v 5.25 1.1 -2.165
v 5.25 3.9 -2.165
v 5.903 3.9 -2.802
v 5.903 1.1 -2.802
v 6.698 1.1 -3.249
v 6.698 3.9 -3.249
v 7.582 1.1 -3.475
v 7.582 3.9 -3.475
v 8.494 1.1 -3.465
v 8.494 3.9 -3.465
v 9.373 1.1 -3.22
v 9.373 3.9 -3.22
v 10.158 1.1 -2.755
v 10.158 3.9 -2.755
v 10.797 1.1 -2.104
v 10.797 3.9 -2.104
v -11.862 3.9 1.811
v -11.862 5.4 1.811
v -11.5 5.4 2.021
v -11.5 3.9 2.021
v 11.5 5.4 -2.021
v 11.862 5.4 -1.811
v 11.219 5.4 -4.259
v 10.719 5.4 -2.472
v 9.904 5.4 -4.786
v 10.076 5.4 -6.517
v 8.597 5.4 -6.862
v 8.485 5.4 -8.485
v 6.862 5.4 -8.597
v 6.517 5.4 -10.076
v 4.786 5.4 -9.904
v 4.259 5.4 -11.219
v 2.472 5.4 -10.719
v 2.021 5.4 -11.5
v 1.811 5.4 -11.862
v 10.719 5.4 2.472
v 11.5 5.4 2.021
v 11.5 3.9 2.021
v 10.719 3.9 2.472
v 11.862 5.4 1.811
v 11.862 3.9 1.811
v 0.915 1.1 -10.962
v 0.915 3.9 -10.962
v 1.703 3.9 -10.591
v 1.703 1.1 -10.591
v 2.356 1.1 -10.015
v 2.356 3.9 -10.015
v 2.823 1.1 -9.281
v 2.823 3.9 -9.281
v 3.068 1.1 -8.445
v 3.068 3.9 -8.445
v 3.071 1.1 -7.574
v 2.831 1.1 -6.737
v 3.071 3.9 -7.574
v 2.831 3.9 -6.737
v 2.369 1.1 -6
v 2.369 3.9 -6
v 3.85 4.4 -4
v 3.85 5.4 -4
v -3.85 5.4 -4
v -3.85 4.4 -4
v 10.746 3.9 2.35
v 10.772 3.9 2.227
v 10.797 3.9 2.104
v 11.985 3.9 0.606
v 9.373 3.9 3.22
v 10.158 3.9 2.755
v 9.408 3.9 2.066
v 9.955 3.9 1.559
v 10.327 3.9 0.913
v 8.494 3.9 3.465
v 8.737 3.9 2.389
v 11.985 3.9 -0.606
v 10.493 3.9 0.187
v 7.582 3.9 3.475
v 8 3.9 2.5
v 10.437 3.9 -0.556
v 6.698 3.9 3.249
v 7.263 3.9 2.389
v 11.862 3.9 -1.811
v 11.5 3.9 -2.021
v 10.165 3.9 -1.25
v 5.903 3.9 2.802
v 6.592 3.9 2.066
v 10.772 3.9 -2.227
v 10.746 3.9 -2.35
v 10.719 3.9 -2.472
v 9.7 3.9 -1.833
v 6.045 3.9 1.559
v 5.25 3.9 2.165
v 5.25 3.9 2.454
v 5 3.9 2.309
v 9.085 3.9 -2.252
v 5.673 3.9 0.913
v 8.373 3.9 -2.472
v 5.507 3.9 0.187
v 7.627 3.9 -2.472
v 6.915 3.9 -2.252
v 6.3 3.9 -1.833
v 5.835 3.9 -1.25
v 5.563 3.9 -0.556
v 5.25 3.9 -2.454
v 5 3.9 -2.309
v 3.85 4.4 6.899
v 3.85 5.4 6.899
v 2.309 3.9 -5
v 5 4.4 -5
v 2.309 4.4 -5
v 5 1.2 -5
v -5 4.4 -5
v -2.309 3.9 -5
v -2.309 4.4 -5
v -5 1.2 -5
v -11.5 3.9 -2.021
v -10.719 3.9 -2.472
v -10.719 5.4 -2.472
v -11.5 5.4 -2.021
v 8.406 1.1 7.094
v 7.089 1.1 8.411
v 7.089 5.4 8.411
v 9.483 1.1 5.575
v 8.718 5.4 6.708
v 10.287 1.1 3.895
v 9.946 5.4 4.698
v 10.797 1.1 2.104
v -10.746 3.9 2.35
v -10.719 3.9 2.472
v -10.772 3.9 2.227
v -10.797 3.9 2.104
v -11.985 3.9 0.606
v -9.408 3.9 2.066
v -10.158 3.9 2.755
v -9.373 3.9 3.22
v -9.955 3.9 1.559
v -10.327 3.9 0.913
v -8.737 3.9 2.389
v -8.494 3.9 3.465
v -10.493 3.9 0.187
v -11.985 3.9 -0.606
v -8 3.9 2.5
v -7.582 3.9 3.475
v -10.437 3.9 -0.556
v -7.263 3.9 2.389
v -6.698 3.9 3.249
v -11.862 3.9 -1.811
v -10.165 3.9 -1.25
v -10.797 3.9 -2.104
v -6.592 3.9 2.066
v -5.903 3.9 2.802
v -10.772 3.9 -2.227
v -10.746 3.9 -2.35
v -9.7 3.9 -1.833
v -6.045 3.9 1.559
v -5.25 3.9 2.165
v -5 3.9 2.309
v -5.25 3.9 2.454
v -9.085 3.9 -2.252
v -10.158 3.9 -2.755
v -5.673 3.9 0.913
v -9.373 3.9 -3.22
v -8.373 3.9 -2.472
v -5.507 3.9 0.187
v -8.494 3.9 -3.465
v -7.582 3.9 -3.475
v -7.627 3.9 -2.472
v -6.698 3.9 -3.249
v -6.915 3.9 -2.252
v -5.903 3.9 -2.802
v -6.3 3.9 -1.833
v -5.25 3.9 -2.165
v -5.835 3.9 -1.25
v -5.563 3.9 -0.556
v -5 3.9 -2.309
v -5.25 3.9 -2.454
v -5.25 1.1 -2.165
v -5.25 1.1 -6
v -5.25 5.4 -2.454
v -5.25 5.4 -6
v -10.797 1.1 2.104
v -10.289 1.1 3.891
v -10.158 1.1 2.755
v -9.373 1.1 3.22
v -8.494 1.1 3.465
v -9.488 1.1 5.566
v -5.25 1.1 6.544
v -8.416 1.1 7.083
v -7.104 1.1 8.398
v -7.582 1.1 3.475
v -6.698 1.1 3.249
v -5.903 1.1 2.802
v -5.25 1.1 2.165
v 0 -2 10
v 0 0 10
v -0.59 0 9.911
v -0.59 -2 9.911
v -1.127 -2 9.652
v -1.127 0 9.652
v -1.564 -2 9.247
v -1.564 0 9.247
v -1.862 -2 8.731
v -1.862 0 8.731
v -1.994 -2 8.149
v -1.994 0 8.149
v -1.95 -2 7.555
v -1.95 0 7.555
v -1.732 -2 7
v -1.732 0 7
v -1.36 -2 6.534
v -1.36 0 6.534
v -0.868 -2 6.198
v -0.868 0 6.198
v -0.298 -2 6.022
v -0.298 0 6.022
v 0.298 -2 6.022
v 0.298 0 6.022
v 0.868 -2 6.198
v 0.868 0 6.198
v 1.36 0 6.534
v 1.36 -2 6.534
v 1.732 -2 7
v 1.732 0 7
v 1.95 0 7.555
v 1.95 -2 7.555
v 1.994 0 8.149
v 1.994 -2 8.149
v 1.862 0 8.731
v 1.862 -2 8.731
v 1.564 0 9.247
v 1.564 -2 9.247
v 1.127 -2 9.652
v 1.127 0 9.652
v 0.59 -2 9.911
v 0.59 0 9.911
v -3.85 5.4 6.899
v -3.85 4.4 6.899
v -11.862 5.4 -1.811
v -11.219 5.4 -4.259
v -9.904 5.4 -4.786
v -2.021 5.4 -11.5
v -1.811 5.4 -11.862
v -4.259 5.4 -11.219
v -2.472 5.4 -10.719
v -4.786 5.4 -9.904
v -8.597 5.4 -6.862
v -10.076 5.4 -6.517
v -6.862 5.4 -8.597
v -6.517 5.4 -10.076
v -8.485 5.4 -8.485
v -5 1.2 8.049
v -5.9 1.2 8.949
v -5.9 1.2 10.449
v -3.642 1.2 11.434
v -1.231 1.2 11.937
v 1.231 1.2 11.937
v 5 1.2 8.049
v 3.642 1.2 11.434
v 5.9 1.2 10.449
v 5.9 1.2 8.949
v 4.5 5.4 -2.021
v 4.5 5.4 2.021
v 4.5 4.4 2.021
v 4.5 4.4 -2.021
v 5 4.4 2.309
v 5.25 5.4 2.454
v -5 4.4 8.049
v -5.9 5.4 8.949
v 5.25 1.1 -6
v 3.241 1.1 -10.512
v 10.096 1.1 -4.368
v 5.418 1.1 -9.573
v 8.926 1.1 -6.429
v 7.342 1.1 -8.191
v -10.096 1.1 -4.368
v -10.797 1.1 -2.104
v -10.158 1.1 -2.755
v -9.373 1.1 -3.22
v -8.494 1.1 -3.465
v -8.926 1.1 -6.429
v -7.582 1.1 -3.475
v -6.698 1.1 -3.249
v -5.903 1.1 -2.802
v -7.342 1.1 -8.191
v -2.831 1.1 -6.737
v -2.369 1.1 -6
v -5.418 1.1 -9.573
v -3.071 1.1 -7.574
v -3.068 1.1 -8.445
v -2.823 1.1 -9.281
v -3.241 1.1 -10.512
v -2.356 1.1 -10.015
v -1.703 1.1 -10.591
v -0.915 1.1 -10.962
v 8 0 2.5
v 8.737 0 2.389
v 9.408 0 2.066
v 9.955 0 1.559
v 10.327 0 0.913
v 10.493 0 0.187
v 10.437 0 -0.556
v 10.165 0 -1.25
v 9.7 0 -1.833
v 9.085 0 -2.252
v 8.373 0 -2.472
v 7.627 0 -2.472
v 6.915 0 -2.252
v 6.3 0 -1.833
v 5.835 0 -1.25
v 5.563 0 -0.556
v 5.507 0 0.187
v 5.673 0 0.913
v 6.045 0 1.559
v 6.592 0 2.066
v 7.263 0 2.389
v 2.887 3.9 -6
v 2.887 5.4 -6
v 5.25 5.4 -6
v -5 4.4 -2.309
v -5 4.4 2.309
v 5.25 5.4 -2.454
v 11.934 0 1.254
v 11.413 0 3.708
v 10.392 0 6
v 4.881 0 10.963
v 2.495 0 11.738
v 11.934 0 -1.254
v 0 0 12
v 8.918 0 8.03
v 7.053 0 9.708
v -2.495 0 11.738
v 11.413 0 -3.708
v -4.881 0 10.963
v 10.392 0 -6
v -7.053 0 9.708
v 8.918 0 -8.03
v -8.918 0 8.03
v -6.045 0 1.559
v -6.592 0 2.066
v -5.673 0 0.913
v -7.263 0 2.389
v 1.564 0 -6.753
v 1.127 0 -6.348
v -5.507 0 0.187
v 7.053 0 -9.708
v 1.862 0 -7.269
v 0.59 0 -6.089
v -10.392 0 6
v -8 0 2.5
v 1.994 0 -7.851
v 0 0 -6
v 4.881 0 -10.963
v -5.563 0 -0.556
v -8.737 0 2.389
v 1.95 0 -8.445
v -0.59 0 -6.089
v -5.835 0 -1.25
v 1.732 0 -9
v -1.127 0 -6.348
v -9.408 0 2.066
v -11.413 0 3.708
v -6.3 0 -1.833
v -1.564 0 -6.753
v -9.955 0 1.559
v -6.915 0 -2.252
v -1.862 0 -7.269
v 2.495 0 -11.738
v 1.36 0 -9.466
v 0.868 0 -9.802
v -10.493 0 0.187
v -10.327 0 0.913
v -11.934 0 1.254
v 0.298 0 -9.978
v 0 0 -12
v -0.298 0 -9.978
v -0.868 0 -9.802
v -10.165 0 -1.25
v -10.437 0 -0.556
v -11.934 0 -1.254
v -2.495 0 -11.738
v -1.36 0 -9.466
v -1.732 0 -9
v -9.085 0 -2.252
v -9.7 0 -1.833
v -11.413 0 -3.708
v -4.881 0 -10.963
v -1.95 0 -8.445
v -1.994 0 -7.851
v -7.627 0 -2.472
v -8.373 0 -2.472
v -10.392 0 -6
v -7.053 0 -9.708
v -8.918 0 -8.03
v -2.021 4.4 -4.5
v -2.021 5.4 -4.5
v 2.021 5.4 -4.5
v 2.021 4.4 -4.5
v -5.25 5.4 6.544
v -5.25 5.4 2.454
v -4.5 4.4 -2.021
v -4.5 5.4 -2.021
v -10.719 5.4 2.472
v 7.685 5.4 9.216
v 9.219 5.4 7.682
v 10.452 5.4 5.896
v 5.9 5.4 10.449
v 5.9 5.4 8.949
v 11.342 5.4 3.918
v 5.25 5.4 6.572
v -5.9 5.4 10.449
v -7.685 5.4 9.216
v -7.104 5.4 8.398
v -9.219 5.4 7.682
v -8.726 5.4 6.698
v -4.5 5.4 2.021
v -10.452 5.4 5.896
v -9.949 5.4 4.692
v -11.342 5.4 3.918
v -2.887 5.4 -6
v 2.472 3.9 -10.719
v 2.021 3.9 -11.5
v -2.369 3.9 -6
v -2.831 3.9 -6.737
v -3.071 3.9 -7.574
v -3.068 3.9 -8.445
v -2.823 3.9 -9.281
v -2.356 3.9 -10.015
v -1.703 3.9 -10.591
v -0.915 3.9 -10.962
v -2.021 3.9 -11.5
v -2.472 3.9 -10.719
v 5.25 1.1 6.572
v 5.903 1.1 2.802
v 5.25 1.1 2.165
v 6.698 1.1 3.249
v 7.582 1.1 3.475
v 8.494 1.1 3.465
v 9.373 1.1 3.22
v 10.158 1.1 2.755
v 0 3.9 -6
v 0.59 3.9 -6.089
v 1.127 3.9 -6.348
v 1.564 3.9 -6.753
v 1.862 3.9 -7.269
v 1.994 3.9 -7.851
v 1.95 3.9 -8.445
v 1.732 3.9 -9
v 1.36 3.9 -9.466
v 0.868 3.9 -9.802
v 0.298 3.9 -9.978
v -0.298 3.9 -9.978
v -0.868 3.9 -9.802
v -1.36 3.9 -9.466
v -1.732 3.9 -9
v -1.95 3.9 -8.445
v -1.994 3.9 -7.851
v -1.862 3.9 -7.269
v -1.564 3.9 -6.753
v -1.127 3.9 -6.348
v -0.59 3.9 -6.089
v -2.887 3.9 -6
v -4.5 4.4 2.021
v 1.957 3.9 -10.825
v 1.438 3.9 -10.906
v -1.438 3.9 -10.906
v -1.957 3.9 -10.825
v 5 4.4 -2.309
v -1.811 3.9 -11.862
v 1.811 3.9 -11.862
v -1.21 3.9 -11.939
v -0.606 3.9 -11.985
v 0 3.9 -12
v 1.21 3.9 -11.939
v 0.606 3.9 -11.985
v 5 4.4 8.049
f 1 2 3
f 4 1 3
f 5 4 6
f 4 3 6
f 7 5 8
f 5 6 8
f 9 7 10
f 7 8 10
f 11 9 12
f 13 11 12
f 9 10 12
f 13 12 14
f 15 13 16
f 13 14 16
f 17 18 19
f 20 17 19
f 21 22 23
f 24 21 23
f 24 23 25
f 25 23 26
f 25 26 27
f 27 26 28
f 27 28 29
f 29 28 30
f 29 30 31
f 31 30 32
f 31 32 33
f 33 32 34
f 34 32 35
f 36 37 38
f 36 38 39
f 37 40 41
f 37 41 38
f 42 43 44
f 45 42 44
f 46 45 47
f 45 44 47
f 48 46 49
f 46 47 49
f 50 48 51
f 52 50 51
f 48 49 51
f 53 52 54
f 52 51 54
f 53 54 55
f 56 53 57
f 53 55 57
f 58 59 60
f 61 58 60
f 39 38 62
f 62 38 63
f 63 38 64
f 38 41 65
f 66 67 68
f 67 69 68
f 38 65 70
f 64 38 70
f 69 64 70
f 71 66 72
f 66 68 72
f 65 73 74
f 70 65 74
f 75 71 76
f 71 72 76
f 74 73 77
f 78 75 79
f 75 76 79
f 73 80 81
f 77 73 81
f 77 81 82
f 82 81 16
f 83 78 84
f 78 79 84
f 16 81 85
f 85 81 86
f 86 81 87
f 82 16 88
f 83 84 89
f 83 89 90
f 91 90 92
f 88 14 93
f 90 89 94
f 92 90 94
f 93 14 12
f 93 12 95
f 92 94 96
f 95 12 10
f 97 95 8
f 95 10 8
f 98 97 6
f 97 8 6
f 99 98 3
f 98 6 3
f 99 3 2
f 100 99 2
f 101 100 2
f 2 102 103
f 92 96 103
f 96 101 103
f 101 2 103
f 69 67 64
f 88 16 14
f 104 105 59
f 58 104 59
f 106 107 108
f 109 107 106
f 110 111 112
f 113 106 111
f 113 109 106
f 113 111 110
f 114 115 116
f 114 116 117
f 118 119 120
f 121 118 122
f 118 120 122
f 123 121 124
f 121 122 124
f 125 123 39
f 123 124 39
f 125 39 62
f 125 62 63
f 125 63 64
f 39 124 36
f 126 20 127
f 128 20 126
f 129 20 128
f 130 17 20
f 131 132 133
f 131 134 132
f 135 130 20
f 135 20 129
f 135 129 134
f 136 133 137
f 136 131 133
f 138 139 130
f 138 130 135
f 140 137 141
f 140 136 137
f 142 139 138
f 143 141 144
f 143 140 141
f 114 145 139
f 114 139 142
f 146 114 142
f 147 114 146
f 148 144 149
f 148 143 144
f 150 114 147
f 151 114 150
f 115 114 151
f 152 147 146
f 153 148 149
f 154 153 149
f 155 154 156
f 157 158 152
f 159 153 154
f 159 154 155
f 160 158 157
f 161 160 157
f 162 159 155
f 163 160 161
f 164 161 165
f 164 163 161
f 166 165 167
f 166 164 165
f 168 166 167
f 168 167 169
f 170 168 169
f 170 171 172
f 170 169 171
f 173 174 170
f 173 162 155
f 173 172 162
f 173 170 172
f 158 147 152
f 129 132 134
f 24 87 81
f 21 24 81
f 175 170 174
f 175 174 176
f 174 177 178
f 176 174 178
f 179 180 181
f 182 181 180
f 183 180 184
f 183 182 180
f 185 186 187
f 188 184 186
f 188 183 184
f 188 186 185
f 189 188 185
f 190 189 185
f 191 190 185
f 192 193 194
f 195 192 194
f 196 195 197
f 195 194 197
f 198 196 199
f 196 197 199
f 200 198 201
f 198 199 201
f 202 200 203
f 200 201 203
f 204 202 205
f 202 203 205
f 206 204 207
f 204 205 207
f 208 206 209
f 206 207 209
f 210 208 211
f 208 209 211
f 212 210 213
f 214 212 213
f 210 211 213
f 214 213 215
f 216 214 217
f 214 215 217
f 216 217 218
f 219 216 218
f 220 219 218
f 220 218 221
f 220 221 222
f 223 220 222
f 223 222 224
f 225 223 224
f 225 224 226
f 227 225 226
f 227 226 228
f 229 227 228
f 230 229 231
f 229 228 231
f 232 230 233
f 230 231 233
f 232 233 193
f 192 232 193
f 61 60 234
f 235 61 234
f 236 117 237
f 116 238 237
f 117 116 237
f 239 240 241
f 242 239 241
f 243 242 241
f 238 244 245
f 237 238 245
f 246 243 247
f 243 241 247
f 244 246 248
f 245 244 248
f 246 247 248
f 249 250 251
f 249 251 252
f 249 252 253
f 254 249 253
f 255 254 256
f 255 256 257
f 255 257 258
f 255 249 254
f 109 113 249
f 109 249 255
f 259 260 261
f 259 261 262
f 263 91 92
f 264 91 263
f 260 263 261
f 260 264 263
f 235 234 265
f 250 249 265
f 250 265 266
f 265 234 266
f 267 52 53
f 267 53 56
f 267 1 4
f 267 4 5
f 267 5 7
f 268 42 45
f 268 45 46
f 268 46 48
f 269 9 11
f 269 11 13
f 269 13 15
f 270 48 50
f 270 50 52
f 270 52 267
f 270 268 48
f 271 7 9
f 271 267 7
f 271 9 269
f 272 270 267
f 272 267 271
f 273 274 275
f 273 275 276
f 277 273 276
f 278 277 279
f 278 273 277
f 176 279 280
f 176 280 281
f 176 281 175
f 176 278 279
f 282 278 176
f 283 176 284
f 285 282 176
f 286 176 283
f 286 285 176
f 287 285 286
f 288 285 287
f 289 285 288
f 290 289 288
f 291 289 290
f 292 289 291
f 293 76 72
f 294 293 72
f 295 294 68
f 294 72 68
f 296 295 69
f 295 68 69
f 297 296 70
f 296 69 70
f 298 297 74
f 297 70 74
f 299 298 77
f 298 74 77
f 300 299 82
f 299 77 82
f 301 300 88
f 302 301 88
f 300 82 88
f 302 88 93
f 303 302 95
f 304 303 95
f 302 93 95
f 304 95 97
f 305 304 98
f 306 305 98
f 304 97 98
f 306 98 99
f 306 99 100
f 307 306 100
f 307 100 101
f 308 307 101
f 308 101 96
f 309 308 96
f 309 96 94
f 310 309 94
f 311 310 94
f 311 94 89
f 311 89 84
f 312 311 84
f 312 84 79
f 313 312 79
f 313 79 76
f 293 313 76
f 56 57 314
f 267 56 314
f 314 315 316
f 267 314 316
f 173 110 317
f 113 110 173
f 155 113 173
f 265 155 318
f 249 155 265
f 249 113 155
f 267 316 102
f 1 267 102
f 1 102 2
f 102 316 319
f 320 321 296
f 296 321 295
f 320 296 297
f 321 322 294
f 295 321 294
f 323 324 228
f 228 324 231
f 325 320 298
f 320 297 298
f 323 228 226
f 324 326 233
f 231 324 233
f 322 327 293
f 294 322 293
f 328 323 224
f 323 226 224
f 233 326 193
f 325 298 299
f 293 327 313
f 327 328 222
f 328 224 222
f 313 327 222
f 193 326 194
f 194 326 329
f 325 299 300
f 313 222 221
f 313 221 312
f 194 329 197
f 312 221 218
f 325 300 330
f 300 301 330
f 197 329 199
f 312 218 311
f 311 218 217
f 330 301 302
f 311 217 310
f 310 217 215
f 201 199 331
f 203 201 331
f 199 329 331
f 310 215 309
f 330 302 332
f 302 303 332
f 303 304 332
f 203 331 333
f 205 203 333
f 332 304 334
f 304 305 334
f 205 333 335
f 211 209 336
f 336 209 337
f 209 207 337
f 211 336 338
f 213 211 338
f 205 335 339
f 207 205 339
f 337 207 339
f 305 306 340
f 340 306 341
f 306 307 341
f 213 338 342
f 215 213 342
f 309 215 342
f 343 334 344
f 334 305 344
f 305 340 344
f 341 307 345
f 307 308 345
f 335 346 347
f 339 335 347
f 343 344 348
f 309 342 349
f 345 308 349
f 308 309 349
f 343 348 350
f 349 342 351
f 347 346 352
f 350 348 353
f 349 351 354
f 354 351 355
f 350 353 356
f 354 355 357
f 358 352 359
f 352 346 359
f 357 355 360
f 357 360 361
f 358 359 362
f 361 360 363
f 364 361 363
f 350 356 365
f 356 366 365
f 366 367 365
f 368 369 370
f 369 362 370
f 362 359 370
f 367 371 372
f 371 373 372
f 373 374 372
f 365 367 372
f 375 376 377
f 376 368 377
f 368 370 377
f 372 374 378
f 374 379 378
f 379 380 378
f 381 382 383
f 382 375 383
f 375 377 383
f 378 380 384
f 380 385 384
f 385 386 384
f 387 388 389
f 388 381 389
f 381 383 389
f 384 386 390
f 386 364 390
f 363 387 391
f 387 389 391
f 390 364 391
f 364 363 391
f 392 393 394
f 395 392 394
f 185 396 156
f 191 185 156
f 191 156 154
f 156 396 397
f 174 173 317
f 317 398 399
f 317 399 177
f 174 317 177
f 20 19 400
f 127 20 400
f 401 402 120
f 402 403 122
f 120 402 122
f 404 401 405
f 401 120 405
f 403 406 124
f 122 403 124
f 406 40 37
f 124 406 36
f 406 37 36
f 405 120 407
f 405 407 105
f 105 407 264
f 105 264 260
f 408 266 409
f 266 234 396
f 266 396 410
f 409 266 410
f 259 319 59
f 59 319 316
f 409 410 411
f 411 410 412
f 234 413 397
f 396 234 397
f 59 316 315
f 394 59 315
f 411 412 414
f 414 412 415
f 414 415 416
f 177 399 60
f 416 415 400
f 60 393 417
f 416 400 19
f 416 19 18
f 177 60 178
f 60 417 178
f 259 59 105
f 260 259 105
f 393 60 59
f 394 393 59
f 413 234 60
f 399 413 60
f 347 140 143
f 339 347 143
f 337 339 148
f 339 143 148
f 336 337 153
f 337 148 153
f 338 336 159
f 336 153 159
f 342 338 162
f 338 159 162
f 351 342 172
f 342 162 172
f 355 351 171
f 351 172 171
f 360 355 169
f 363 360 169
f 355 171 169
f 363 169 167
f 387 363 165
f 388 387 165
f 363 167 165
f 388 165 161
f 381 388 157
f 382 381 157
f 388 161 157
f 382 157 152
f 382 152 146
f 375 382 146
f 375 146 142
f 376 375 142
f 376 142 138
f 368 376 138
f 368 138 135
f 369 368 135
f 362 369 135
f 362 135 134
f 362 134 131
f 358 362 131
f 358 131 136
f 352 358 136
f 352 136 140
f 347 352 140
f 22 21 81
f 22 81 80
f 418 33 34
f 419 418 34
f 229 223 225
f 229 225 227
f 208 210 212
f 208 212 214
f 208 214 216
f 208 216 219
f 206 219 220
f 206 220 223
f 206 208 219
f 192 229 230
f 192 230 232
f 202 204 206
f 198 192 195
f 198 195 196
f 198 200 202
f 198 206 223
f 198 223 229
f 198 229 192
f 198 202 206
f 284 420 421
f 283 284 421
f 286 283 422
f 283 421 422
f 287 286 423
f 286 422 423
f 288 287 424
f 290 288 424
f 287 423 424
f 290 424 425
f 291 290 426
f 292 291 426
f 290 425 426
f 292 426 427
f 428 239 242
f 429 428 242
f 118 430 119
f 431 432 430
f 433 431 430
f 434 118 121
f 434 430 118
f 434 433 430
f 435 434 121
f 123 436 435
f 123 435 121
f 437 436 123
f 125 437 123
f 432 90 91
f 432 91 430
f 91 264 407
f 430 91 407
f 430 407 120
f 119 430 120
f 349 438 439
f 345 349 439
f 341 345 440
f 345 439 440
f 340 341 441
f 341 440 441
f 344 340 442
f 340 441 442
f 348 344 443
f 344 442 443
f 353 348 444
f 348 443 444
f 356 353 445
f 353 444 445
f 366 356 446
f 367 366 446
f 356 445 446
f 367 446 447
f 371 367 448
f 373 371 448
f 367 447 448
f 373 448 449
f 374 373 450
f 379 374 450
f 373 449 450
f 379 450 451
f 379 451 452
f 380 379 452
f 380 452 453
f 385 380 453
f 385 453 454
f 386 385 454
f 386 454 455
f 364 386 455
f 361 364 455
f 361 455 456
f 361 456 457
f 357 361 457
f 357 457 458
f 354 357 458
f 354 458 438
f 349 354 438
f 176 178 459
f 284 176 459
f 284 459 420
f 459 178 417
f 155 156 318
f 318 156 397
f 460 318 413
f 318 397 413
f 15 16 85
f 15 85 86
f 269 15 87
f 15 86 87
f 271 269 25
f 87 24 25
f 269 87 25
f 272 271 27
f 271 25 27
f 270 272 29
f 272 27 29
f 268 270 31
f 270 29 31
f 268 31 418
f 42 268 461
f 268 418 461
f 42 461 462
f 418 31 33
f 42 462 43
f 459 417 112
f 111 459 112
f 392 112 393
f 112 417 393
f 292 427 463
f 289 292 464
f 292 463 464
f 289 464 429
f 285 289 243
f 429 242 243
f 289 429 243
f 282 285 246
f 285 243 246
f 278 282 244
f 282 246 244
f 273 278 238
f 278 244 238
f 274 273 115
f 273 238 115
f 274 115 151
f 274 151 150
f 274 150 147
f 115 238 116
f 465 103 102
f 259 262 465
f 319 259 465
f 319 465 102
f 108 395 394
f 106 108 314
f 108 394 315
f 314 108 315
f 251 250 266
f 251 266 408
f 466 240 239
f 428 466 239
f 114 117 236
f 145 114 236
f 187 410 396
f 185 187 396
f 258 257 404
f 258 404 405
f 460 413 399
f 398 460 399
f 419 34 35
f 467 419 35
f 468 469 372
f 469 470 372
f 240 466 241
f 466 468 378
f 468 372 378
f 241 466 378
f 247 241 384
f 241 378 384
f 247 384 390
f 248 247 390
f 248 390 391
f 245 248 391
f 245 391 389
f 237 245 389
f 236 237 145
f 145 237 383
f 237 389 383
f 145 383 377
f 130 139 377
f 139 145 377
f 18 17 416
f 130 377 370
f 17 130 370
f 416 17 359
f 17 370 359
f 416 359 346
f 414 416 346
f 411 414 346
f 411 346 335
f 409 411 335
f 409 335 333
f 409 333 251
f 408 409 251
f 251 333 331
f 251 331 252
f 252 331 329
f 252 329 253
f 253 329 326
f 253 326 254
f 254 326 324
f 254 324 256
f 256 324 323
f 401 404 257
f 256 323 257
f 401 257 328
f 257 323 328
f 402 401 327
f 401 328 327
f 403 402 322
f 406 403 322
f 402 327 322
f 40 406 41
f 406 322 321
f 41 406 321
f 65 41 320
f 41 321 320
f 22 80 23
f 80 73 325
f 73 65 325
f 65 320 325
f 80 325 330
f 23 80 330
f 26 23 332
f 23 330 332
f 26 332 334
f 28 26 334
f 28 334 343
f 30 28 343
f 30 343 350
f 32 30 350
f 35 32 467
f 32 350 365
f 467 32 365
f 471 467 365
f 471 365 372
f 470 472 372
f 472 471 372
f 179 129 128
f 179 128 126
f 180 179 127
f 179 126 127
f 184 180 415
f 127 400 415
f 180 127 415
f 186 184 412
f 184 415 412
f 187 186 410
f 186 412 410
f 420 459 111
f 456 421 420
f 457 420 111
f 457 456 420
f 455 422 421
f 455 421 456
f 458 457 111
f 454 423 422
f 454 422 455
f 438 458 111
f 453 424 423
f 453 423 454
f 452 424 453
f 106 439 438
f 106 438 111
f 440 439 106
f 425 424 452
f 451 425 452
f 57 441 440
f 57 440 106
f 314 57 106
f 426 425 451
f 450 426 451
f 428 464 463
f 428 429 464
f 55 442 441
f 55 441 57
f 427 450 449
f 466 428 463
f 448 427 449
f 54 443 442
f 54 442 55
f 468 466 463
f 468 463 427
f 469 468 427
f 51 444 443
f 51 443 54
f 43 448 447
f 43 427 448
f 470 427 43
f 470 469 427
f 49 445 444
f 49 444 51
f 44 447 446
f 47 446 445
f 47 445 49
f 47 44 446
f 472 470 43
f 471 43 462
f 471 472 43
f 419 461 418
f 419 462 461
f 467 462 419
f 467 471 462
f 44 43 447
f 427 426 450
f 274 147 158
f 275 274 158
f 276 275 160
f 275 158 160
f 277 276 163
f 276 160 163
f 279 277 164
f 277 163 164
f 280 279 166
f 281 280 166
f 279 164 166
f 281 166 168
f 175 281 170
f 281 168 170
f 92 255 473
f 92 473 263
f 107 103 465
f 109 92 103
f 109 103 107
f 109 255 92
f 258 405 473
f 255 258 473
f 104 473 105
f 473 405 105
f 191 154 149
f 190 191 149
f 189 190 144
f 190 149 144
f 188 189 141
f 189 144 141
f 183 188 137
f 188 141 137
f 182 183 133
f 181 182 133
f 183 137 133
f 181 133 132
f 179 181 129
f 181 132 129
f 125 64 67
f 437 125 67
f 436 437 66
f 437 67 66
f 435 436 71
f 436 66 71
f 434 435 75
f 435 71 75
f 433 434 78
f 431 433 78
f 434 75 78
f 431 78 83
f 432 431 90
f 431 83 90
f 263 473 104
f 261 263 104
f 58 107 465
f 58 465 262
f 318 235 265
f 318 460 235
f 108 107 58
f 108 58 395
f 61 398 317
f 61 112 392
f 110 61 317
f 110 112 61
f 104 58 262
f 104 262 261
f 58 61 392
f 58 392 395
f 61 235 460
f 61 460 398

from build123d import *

# Parameters (mm, degrees)
SKETCH1_R           = 12
BOSS_EXTRUDE1_DEPTH = 5.4
CUT_EXTRUDE1_START  = -4.2
CUT_EXTRUDE1_DEPTH  = 4.2
BOSS_EXTRUDE2_DEPTH = 1
SKETCH4_R           = 2.5
SKETCH4_R_2         = 2
CUT_EXTRUDE2_DEPTH  = 11
SKETCH5_R           = 2
BOSS_EXTRUDE3_DEPTH = 2
CUT_EXTRUDE3_DEPTH  = 4.3
CUT_EXTRUDE4_DEPTH  = 1.5


with BuildPart() as part:
    # Sketch1 → Boss-Extrude1 (new body)
    with BuildSketch(Plane(origin=(0, 0, 0), x_dir=(1, 0, 0), z_dir=(0, 1, 0))):
        with Locations(Location((0, 0, 0), (0, 0, 90))):
            Circle(SKETCH1_R)
    extrude(amount=BOSS_EXTRUDE1_DEPTH)

    # Sketch2 → Cut-Extrude1 (cut)
    with BuildSketch(Plane(origin=(0, 5.4, 0), x_dir=(1, 0, 0), z_dir=(0, 1, 0)).offset(CUT_EXTRUDE1_START)):
        with BuildLine():
            Line((5, -5), (5, 5))
            Line((5, 5), (-5, 5))
            Line((-5, 5), (-5, -5))
            Line((-5, -5), (-5, -8.049401897))
            Line((-5, -8.049401897), (-5.9, -8.949401897))
            Line((-5.9, -8.949401897), (-5.9, -10.449401897))
            ThreePointArc((-5.9, -10.449401897), (0, -12), (5.9, -10.449401897))
            Line((5.9, -10.449401897), (5.9, -8.949401897))
            Line((5.9, -8.949401897), (5, -8.049401897))
            Line((5, -8.049401897), (5, -5))
        make_face()
    extrude(amount=CUT_EXTRUDE1_DEPTH, mode=Mode.SUBTRACT)

    # Sketch3 → Boss-Extrude2 (add)
    with BuildSketch(Plane(origin=(0, 5.4, 0), x_dir=(1, 0, 0), z_dir=(0, 1, 0))):
        Polygon((5, -8.049401897), (3.85, -6.899401897), (3.85, 4), (-3.85, 4), (-3.85, -6.899401897), (-5, -8.049401897), (-5, 5), (5, 5), align=None)
    extrude(amount=-BOSS_EXTRUDE2_DEPTH)

    # Sketch4 → Cut-Extrude2 (cut)
    with BuildSketch(Plane(origin=(0, 5.4, 0), x_dir=(1, 0, 0), z_dir=(0, 1, 0))):
        with Locations(Location((-8, 0, 0), (0, 0, 270))):
            Circle(SKETCH4_R)
        with Locations(Location((8, 0, 0), (0, 0, 270))):
            Circle(SKETCH4_R)
        with Locations(Location((0, 8, 0), (0, 0, 270))):
            Circle(SKETCH4_R_2)
    extrude(amount=-CUT_EXTRUDE2_DEPTH, mode=Mode.SUBTRACT)

    # Sketch5 → Boss-Extrude3 (add)
    with BuildSketch(Plane.XZ):
        with Locations(Location((0, 8, 0), (0, 0, 90))):
            Circle(SKETCH5_R)
    extrude(amount=BOSS_EXTRUDE3_DEPTH)

    # Sketch6 → Cut-Extrude3 (cut)
    with BuildSketch(Plane(origin=(0, 5.4, 0), x_dir=(1, 0, 0), z_dir=(0, 1, 0))):
        with BuildLine():
            ThreePointArc((-10.796875, -2.104160221), (-9.487597374, -5.566461719), (-7.103967779, -8.398430913))
            Line((-7.103967779, -8.398430913), (-5.25, -6.544463134))
            Line((-5.25, -6.544463134), (-5.25, -2.165063509))
            ThreePointArc((-5.25, -2.165063509), (-8.038426801, -3.499789048), (-10.796875, -2.104160221))
        make_face()
        with BuildLine():
            ThreePointArc((-10.796875, 2.104160221), (-8.038426801, 3.499789048), (-5.25, 2.165063509))
            Line((-5.25, 2.165063509), (-5.25, 6))
            Line((-5.25, 6), (-2.368543856, 6))
            ThreePointArc((-2.368543856, 6), (-2.974984046, 8.871475717), (-0.915039062, 10.961875))
            ThreePointArc((-0.915039062, 10.961875), (-7.34213937, 8.191031039), (-10.796875, 2.104160221))
        make_face()
        with BuildLine():
            Line((5.25, -6.571554413), (7.089279147, -8.41083356))
            ThreePointArc((7.089279147, -8.41083356), (9.482729549, -5.574750246), (10.796875, -2.104160221))
            ThreePointArc((10.796875, -2.104160221), (8.038426801, -3.499789048), (5.25, -2.165063509))
            Line((5.25, -2.165063509), (5.25, -6.571554413))
        make_face()
        with BuildLine():
            ThreePointArc((0.915039062, 10.961875), (2.974984046, 8.871475717), (2.368543856, 6))
            Line((2.368543856, 6), (5.25, 6))
            Line((5.25, 6), (5.25, 2.165063509))
            ThreePointArc((5.25, 2.165063509), (8.038426801, 3.499789048), (10.796875, 2.104160221))
            ThreePointArc((10.796875, 2.104160221), (7.34213937, 8.191031039), (0.915039062, 10.961875))
        make_face()
    extrude(amount=-CUT_EXTRUDE3_DEPTH, mode=Mode.SUBTRACT)

    # Sketch7 → Cut-Extrude4 (cut)
    with BuildSketch(Plane(origin=(0, 5.4, 0), x_dir=(1, 0, 0), z_dir=(0, 1, 0))):
        Polygon((11.5, 2.020725942), (12.766112926, 1.289735303), (12.766112926, -1.289735303), (11.5, -2.020725942), (8, -4.041451884), (4.5, -2.020725942), (4.5, 2.020725942), (8, 4.041451884), align=None)
        Polygon((2.020725942, 4.5), (4.041451884, 8), (2.020725942, 11.5), (1.300085439, 12.748185966), (-1.300085439, 12.748185966), (-2.020725942, 11.5), (-4.041451884, 8), (-2.020725942, 4.5), align=None)
        Polygon((-4.5, -2.020725942), (-4.5, 2.020725942), (-8, 4.041451884), (-11.5, 2.020725942), (-12.378564681, 1.513486387), (-12.378564681, -1.513486387), (-11.5, -2.020725942), (-8, -4.041451884), align=None)
    extrude(amount=-CUT_EXTRUDE4_DEPTH, mode=Mode.SUBTRACT)


solid = part.part
